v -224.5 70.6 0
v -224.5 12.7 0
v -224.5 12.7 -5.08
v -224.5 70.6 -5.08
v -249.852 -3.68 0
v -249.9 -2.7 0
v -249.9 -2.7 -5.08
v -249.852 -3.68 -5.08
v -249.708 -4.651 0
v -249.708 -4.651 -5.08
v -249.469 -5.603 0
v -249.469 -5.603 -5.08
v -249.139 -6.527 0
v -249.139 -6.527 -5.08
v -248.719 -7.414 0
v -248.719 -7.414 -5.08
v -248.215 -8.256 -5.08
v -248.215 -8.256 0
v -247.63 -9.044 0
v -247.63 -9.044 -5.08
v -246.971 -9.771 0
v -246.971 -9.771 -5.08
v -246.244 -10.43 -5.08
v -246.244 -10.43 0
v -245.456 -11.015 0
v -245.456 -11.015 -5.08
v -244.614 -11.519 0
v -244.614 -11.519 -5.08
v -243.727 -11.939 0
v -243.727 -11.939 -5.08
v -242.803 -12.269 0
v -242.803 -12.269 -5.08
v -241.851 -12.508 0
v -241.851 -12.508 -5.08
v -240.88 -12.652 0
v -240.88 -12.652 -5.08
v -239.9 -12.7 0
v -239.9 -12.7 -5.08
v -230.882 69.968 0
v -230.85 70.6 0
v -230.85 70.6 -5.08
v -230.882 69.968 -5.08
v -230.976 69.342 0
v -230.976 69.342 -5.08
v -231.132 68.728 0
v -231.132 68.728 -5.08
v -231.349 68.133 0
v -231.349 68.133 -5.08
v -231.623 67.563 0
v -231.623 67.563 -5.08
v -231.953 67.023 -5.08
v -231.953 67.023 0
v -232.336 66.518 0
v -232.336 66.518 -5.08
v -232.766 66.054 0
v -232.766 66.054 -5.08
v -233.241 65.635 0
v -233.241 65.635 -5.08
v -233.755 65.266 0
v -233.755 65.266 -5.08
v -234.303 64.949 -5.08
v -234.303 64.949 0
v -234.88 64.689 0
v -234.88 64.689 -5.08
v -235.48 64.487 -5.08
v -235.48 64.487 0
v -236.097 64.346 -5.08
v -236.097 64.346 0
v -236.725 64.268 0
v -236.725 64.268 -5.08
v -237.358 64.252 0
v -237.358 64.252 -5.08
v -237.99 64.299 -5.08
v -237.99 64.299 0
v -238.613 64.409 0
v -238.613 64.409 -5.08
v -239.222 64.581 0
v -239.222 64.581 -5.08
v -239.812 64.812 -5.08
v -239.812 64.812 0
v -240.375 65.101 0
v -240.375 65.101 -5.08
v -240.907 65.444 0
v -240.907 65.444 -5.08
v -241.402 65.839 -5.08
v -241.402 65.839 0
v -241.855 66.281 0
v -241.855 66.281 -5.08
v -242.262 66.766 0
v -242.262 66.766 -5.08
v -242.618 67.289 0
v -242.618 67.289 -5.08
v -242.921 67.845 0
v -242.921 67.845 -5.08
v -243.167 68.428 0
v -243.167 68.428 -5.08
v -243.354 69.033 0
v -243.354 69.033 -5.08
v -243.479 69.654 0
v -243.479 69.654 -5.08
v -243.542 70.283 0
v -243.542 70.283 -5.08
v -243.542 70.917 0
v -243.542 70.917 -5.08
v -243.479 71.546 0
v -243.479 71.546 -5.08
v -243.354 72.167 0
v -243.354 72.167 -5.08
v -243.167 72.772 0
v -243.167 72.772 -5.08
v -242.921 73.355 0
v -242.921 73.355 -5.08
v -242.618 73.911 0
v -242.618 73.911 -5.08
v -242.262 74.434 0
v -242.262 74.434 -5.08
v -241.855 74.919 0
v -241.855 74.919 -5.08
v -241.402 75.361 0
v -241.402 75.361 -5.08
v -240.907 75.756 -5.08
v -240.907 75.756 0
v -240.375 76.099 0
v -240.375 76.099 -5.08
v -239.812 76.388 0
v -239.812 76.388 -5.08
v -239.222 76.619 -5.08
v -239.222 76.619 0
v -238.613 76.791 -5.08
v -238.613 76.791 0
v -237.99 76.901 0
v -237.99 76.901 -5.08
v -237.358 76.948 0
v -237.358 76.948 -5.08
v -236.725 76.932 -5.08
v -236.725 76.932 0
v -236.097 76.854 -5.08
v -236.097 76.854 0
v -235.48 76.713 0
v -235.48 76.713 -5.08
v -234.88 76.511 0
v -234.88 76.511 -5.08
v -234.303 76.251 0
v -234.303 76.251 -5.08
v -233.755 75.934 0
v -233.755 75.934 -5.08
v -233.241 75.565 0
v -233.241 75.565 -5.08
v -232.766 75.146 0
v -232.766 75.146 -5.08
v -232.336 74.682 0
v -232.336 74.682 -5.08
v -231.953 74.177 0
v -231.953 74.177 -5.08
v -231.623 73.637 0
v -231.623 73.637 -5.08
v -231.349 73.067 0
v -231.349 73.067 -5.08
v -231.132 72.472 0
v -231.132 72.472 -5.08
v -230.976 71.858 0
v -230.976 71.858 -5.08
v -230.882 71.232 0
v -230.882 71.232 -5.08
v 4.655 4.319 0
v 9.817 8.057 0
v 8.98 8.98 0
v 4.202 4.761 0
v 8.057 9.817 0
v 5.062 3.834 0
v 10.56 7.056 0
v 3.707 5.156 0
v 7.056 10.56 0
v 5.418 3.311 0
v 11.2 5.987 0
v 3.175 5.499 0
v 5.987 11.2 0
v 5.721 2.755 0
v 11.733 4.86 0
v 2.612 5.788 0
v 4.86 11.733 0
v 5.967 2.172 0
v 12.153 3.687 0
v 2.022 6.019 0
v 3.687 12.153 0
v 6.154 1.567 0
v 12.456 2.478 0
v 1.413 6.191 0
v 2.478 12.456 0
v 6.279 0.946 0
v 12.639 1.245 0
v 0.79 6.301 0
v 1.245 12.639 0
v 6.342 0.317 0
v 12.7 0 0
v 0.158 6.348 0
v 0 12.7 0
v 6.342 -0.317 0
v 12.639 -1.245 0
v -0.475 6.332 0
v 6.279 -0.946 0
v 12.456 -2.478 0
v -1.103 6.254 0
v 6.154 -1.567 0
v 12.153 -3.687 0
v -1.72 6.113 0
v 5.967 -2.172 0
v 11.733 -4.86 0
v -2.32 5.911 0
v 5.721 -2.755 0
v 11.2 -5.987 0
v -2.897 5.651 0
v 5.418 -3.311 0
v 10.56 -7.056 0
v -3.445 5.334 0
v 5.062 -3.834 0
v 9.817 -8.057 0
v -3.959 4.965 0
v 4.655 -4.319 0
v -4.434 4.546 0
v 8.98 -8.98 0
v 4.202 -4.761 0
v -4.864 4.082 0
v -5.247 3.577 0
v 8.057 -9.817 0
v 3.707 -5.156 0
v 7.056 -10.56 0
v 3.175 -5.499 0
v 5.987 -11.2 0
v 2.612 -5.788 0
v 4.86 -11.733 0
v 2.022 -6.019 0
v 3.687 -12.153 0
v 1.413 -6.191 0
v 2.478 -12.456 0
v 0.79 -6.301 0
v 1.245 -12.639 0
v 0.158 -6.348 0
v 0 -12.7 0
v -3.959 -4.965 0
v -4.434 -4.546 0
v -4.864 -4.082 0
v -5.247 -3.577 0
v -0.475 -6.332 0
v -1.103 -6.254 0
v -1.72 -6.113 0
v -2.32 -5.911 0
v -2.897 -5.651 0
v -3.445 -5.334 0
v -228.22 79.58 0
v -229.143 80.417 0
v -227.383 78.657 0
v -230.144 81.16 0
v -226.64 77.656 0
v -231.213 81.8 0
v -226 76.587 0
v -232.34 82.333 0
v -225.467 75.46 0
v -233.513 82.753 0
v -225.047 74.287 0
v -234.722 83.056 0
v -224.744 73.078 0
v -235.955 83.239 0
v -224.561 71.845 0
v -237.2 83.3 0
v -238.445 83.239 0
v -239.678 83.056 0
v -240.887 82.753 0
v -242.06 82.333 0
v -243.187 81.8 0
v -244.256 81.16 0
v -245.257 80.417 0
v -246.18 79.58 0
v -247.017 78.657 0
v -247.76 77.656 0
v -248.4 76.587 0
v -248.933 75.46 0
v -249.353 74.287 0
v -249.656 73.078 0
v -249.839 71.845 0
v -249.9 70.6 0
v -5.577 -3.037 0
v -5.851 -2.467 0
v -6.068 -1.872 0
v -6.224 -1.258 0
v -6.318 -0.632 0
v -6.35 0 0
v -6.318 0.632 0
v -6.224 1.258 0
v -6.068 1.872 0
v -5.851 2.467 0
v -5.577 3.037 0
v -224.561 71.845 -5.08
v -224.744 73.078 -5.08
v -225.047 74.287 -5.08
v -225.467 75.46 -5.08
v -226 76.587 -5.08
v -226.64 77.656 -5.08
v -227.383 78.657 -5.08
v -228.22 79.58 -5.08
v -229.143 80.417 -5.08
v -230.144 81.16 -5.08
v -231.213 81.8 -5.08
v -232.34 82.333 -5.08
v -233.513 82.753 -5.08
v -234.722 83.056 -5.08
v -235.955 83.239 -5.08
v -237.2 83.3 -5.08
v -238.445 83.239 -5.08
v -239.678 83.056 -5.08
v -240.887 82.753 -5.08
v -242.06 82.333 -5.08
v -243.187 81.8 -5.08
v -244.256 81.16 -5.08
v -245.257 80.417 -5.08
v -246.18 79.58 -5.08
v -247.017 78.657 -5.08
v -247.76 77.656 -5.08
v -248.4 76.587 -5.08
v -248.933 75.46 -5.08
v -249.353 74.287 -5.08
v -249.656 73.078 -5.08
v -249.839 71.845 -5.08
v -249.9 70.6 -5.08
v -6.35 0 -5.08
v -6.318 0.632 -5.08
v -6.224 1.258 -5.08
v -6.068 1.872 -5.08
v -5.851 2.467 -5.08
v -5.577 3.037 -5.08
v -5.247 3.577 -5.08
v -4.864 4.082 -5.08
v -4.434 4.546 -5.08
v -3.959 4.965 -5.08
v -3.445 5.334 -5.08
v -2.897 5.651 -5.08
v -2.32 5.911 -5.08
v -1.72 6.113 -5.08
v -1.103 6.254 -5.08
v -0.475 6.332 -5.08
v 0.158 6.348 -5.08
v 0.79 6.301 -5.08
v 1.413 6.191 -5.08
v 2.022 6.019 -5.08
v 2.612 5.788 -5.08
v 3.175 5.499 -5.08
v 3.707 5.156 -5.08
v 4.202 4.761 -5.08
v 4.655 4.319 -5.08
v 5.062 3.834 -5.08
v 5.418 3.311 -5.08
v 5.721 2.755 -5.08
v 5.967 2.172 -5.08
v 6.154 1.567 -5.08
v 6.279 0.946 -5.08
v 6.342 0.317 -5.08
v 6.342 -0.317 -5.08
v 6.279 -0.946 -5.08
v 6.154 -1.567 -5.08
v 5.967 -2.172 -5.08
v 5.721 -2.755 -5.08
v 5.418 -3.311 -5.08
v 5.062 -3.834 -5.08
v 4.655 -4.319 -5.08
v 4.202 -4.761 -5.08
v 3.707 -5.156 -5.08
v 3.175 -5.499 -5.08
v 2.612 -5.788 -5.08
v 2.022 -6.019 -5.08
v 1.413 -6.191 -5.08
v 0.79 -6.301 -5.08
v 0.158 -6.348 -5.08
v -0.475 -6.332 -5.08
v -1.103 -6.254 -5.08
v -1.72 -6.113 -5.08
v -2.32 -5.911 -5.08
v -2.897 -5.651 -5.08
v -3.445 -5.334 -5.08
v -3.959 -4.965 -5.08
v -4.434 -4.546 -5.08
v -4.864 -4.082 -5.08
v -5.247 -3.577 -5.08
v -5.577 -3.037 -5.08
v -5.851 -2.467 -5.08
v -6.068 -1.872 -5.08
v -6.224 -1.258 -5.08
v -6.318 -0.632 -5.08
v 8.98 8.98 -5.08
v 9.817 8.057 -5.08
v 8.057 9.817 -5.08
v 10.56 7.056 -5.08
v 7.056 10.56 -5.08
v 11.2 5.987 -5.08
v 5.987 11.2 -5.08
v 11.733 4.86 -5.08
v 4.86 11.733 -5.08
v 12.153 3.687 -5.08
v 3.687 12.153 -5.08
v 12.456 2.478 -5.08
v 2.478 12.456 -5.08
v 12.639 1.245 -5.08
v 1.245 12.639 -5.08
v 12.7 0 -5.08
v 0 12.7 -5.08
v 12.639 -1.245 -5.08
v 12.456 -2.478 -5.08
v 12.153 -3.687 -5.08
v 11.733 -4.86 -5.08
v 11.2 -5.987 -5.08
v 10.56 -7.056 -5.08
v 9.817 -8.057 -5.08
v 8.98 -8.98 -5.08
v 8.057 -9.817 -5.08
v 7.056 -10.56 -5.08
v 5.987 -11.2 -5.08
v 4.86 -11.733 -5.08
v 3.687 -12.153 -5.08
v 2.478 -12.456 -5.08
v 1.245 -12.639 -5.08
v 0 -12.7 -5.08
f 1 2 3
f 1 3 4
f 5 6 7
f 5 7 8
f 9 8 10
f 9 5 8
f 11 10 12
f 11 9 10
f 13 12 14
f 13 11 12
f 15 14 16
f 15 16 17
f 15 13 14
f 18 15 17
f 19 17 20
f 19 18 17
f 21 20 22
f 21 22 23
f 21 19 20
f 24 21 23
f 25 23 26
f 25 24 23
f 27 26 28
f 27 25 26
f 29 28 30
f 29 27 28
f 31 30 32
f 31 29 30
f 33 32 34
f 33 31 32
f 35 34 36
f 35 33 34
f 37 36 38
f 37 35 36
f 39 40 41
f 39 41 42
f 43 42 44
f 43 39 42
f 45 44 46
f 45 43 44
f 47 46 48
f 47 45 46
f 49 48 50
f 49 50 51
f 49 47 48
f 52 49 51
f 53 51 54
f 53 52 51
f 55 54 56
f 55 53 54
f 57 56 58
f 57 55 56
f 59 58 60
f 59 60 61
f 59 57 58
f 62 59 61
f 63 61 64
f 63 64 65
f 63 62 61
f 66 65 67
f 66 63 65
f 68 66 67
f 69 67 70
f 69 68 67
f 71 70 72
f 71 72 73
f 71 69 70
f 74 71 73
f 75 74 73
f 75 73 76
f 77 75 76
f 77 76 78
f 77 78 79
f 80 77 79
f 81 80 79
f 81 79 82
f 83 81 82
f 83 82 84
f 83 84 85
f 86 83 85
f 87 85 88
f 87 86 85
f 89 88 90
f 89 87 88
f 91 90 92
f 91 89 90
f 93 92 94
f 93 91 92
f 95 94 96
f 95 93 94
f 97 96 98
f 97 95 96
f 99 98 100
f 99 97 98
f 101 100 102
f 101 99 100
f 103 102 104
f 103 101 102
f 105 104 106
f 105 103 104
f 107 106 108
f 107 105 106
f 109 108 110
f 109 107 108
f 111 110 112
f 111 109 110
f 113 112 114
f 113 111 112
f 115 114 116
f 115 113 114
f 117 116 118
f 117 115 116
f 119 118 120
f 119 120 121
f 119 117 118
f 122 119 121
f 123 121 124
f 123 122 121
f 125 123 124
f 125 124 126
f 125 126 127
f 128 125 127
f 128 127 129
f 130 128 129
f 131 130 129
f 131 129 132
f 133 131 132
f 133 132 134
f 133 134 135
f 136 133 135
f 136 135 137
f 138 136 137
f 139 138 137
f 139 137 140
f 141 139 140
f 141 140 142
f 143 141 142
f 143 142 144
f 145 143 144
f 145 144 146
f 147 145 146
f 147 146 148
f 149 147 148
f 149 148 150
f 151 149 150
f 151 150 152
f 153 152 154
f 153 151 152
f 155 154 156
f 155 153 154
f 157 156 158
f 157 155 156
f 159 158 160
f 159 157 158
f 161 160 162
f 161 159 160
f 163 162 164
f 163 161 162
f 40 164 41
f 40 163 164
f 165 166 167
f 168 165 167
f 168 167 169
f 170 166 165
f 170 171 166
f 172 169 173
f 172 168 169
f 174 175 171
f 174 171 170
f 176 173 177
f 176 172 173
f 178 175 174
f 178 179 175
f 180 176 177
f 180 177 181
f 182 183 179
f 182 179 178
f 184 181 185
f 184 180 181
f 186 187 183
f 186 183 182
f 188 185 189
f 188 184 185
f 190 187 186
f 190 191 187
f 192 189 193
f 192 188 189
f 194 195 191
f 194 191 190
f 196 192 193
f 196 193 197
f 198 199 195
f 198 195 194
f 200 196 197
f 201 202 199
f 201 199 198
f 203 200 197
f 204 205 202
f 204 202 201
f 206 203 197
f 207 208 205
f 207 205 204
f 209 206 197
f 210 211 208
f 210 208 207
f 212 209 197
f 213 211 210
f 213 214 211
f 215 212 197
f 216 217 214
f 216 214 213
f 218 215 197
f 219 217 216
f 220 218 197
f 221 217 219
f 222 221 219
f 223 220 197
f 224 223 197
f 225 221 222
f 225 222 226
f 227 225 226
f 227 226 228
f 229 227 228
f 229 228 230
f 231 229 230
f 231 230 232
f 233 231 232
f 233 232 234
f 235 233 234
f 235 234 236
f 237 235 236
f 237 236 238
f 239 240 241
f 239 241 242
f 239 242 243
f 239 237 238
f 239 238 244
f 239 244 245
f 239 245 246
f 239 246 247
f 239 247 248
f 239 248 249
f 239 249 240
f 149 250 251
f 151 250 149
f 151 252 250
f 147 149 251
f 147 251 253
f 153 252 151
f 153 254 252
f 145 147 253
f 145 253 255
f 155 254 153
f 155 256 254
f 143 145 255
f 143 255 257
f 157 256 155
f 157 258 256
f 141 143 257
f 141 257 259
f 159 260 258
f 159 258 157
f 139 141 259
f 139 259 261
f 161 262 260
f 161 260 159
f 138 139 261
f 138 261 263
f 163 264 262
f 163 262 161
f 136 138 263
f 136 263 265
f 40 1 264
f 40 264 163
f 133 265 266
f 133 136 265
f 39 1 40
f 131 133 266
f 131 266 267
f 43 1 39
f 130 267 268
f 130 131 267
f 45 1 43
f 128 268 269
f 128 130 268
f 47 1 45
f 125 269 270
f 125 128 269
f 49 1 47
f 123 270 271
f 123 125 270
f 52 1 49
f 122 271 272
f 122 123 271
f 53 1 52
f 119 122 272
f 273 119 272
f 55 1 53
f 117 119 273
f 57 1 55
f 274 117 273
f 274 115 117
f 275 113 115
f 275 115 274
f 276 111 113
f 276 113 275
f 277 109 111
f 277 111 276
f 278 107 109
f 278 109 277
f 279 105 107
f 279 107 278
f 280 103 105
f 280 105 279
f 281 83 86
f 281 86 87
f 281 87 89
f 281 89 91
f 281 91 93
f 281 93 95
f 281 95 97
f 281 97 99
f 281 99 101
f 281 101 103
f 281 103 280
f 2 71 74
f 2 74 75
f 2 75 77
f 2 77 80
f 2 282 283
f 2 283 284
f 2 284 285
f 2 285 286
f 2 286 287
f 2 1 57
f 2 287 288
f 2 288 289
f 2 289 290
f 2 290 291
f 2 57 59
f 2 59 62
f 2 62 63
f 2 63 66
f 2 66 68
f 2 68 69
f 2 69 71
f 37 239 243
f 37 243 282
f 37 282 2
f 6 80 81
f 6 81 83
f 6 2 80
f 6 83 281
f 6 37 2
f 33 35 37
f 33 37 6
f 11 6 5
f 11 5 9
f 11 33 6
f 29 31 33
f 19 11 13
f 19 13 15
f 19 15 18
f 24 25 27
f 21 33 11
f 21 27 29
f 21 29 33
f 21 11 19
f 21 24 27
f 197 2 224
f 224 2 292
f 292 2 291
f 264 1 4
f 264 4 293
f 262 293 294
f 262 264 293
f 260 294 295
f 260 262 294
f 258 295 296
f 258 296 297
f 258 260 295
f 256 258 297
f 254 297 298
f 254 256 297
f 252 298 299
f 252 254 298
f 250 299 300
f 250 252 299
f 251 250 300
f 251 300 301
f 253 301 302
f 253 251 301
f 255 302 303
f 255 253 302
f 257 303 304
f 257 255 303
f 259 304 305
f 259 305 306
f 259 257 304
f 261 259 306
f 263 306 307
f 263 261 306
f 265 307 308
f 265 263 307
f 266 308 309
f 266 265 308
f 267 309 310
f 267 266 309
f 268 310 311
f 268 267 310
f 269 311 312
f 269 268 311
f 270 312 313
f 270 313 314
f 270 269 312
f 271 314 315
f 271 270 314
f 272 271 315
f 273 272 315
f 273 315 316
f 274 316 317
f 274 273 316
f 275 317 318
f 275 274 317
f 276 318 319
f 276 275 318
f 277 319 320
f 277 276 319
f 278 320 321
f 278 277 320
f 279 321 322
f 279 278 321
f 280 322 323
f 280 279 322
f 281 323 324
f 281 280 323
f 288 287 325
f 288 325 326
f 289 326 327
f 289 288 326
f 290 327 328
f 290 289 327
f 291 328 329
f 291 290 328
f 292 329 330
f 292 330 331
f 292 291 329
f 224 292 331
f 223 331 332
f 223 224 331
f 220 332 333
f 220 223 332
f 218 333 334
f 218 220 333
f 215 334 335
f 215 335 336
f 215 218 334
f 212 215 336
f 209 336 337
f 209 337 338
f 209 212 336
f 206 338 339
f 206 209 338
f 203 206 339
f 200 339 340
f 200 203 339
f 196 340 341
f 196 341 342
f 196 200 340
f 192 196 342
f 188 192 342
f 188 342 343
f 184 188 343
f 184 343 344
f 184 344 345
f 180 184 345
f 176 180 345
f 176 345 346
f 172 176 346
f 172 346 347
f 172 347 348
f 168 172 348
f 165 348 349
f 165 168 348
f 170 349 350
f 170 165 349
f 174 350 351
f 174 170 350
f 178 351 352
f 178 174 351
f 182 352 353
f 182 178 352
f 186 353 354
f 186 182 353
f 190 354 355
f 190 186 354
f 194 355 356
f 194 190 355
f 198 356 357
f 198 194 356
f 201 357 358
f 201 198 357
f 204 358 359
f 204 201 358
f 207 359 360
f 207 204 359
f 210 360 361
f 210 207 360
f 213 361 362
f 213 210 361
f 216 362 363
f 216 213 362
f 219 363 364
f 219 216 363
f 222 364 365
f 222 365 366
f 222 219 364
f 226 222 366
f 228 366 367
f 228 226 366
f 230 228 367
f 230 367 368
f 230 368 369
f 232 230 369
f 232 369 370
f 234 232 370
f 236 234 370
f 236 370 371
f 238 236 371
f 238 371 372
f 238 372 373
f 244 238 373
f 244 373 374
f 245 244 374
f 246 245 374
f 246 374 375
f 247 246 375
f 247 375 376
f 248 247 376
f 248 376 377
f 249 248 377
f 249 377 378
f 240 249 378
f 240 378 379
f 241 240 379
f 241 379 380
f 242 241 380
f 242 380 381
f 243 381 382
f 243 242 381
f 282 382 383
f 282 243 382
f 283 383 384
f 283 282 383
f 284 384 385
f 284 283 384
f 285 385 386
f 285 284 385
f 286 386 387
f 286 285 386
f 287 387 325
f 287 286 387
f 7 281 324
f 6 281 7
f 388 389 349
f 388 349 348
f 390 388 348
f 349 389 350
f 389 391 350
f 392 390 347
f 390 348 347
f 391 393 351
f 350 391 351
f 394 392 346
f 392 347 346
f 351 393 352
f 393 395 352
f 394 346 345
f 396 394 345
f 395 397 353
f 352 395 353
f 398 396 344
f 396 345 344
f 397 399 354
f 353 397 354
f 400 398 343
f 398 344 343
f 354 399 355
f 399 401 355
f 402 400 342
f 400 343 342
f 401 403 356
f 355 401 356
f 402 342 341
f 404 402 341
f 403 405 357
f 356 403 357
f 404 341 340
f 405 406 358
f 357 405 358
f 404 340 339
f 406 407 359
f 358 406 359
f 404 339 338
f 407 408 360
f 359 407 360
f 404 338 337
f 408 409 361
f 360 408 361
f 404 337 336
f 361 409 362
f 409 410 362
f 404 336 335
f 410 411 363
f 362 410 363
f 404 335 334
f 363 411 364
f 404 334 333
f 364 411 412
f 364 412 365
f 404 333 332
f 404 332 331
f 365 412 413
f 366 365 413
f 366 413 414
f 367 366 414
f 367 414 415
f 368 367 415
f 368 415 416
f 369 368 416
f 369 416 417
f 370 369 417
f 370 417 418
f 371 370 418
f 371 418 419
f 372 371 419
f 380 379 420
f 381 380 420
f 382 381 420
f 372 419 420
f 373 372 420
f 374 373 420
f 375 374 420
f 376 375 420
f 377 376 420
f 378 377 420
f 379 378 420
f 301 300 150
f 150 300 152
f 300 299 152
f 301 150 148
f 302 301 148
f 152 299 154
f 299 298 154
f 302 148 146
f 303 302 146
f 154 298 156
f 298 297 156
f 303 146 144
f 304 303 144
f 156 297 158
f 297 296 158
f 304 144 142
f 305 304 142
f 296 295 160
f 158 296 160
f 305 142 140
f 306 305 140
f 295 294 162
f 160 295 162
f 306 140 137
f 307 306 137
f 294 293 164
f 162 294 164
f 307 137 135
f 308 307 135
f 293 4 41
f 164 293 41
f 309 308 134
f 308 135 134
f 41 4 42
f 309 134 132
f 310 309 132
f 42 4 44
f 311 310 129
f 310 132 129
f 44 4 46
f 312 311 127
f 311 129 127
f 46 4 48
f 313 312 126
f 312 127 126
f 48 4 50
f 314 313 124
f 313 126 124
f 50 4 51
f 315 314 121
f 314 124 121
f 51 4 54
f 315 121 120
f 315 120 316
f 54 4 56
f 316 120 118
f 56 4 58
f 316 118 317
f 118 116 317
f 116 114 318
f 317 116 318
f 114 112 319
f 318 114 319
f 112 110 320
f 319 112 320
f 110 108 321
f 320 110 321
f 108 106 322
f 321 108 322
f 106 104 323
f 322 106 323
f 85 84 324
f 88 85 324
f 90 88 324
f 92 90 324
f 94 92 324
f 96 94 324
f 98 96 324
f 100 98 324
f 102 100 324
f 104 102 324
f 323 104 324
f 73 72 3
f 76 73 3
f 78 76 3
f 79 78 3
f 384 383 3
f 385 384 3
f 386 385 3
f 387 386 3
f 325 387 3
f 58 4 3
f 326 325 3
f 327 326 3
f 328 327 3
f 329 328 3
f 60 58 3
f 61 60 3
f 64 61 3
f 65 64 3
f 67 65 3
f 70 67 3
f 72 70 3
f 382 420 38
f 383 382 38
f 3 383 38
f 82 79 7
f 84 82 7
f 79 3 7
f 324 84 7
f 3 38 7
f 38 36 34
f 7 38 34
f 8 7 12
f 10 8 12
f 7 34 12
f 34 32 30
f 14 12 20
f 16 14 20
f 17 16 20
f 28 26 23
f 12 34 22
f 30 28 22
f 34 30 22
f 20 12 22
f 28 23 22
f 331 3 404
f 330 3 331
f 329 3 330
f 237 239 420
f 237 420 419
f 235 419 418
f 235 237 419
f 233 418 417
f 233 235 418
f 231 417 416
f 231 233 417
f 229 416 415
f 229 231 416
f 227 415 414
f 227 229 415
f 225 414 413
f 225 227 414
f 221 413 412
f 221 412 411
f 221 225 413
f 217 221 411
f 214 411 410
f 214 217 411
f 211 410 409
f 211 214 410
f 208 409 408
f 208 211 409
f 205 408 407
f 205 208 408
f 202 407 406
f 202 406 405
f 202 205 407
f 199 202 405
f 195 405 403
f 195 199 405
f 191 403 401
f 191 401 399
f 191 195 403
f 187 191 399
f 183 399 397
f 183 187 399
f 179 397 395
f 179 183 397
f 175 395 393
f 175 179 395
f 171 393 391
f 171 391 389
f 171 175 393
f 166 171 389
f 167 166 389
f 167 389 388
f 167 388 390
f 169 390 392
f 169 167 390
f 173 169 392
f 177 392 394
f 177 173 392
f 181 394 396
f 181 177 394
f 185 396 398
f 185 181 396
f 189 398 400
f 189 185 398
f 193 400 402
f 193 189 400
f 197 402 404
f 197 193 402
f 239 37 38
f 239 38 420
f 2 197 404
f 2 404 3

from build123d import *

# Parameters (mm, degrees)
SKETCH2_R           = 6.35
BOSS_EXTRUDE1_DEPTH = 5.08


with BuildPart() as part:
    # Sketch2 → Boss-Extrude1 (new body)
    with BuildSketch(Plane(origin=(0, 0, 0), x_dir=(1, 0, 0), z_dir=(0, 0, -1))):
        with BuildLine():
            Line((-249.9, -70.6), (-249.9, 2.7))
            ThreePointArc((-249.9, 2.7), (-246.971067812, 9.771067812), (-239.9, 12.7))
            Line((-239.9, 12.7), (0, 12.7))
            ThreePointArc((0, 12.7), (12.7, 0), (0, -12.7))
            Line((0, -12.7), (-224.5, -12.7))
            Line((-224.5, -12.7), (-224.5, -70.6))
            ThreePointArc((-224.5, -70.6), (-237.2, -83.3), (-249.9, -70.6))
        make_face()
        with Locations(Location((0, 0, 0), (0, 0, 180))):
            Circle(SKETCH2_R, mode=Mode.SUBTRACT)
        with Locations((-237.2, -70.6)):
            Circle(SKETCH2_R, mode=Mode.SUBTRACT)
    extrude(amount=BOSS_EXTRUDE1_DEPTH)


solid = part.part
